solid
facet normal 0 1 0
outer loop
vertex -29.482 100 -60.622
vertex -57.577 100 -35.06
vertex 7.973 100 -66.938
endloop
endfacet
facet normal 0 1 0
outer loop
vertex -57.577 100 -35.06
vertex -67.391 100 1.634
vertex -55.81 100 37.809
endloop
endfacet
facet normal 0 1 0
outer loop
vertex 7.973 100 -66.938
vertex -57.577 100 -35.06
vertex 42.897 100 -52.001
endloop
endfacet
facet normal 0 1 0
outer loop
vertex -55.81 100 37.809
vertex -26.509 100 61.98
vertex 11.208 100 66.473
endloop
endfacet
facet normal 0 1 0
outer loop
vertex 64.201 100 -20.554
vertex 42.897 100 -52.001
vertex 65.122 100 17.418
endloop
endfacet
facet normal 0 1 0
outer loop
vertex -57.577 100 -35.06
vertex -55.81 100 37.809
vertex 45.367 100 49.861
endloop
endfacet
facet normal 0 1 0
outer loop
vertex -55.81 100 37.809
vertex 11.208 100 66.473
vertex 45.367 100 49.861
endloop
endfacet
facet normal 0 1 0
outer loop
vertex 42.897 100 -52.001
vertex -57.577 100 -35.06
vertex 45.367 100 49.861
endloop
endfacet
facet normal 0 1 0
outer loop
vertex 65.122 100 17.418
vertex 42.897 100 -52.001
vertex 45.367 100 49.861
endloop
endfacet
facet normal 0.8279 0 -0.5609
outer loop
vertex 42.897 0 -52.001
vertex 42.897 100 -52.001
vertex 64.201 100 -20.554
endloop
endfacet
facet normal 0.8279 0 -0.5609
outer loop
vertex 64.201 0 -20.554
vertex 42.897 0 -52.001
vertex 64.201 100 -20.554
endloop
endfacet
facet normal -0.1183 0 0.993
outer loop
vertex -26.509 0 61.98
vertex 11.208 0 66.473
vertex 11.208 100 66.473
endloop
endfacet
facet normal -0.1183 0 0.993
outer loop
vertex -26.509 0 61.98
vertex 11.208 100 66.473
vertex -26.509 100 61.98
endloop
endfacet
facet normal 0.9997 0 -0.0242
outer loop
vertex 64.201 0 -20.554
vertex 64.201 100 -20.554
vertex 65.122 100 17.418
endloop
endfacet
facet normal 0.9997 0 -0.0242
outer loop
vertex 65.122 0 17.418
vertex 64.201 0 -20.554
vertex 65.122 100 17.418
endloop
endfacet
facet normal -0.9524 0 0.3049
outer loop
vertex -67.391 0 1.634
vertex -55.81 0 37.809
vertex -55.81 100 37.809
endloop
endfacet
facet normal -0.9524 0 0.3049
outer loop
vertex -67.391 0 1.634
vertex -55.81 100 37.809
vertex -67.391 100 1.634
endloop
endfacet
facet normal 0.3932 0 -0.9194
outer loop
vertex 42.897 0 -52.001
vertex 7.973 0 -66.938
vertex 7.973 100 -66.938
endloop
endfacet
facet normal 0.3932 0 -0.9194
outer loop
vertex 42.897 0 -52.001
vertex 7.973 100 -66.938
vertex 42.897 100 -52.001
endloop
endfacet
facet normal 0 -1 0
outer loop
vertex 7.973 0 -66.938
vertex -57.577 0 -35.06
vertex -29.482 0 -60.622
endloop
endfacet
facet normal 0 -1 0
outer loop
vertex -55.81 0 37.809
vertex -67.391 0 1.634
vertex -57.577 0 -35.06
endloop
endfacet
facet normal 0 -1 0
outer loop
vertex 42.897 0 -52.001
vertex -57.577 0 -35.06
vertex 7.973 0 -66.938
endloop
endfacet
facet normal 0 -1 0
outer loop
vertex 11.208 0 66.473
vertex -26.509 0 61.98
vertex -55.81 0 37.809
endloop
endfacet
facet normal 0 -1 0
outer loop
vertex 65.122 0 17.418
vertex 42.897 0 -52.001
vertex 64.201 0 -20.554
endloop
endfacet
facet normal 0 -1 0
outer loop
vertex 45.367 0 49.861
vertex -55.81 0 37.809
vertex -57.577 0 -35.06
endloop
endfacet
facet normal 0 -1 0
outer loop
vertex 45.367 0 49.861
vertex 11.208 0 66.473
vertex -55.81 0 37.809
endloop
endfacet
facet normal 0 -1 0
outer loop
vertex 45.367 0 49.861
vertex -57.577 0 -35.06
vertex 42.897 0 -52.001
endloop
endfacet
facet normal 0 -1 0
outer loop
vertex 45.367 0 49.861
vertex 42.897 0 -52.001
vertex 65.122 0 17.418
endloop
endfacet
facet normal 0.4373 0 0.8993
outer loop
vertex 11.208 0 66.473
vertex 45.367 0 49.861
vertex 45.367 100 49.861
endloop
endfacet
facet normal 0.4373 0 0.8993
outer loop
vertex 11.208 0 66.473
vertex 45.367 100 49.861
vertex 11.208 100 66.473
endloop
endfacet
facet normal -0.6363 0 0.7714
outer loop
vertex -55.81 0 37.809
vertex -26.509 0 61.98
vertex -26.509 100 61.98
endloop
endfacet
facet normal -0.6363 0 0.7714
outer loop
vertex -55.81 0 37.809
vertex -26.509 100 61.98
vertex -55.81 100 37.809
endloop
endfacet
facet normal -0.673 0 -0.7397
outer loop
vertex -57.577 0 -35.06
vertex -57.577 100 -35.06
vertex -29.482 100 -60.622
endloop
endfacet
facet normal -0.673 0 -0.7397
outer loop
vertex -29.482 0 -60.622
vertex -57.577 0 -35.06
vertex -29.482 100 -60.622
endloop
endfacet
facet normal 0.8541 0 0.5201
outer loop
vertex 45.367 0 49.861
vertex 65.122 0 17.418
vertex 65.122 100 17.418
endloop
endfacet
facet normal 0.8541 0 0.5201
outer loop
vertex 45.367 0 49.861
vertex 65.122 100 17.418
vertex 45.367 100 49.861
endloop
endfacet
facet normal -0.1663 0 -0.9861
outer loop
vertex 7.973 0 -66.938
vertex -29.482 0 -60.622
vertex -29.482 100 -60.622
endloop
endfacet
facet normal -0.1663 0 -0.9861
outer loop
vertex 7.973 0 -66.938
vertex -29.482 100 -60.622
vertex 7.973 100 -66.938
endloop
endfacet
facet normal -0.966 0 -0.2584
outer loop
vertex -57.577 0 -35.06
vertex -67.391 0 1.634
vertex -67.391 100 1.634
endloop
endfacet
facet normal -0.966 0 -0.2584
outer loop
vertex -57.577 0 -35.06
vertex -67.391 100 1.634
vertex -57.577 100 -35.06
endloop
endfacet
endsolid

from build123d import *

# Parameters (mm, degrees)
F1_DEPTH = 100


with BuildPart() as f1:
    # F0 (on Front) → F1 (new body)
    with BuildSketch(Plane.XZ):
        Polygon((65.12177, 17.418353), (45.366846, 49.860738), (11.208269, 66.472691), (-26.508854, 61.980034), (-55.809603, 37.809154), (-67.391198, 1.634135), (-57.576563, -35.05971), (-29.481777, -60.622346), (7.973266, -66.937814), (42.896852, -52.001), (64.200992, -20.554235), align=None)
    extrude(amount=-F1_DEPTH)


solid = f1.part
